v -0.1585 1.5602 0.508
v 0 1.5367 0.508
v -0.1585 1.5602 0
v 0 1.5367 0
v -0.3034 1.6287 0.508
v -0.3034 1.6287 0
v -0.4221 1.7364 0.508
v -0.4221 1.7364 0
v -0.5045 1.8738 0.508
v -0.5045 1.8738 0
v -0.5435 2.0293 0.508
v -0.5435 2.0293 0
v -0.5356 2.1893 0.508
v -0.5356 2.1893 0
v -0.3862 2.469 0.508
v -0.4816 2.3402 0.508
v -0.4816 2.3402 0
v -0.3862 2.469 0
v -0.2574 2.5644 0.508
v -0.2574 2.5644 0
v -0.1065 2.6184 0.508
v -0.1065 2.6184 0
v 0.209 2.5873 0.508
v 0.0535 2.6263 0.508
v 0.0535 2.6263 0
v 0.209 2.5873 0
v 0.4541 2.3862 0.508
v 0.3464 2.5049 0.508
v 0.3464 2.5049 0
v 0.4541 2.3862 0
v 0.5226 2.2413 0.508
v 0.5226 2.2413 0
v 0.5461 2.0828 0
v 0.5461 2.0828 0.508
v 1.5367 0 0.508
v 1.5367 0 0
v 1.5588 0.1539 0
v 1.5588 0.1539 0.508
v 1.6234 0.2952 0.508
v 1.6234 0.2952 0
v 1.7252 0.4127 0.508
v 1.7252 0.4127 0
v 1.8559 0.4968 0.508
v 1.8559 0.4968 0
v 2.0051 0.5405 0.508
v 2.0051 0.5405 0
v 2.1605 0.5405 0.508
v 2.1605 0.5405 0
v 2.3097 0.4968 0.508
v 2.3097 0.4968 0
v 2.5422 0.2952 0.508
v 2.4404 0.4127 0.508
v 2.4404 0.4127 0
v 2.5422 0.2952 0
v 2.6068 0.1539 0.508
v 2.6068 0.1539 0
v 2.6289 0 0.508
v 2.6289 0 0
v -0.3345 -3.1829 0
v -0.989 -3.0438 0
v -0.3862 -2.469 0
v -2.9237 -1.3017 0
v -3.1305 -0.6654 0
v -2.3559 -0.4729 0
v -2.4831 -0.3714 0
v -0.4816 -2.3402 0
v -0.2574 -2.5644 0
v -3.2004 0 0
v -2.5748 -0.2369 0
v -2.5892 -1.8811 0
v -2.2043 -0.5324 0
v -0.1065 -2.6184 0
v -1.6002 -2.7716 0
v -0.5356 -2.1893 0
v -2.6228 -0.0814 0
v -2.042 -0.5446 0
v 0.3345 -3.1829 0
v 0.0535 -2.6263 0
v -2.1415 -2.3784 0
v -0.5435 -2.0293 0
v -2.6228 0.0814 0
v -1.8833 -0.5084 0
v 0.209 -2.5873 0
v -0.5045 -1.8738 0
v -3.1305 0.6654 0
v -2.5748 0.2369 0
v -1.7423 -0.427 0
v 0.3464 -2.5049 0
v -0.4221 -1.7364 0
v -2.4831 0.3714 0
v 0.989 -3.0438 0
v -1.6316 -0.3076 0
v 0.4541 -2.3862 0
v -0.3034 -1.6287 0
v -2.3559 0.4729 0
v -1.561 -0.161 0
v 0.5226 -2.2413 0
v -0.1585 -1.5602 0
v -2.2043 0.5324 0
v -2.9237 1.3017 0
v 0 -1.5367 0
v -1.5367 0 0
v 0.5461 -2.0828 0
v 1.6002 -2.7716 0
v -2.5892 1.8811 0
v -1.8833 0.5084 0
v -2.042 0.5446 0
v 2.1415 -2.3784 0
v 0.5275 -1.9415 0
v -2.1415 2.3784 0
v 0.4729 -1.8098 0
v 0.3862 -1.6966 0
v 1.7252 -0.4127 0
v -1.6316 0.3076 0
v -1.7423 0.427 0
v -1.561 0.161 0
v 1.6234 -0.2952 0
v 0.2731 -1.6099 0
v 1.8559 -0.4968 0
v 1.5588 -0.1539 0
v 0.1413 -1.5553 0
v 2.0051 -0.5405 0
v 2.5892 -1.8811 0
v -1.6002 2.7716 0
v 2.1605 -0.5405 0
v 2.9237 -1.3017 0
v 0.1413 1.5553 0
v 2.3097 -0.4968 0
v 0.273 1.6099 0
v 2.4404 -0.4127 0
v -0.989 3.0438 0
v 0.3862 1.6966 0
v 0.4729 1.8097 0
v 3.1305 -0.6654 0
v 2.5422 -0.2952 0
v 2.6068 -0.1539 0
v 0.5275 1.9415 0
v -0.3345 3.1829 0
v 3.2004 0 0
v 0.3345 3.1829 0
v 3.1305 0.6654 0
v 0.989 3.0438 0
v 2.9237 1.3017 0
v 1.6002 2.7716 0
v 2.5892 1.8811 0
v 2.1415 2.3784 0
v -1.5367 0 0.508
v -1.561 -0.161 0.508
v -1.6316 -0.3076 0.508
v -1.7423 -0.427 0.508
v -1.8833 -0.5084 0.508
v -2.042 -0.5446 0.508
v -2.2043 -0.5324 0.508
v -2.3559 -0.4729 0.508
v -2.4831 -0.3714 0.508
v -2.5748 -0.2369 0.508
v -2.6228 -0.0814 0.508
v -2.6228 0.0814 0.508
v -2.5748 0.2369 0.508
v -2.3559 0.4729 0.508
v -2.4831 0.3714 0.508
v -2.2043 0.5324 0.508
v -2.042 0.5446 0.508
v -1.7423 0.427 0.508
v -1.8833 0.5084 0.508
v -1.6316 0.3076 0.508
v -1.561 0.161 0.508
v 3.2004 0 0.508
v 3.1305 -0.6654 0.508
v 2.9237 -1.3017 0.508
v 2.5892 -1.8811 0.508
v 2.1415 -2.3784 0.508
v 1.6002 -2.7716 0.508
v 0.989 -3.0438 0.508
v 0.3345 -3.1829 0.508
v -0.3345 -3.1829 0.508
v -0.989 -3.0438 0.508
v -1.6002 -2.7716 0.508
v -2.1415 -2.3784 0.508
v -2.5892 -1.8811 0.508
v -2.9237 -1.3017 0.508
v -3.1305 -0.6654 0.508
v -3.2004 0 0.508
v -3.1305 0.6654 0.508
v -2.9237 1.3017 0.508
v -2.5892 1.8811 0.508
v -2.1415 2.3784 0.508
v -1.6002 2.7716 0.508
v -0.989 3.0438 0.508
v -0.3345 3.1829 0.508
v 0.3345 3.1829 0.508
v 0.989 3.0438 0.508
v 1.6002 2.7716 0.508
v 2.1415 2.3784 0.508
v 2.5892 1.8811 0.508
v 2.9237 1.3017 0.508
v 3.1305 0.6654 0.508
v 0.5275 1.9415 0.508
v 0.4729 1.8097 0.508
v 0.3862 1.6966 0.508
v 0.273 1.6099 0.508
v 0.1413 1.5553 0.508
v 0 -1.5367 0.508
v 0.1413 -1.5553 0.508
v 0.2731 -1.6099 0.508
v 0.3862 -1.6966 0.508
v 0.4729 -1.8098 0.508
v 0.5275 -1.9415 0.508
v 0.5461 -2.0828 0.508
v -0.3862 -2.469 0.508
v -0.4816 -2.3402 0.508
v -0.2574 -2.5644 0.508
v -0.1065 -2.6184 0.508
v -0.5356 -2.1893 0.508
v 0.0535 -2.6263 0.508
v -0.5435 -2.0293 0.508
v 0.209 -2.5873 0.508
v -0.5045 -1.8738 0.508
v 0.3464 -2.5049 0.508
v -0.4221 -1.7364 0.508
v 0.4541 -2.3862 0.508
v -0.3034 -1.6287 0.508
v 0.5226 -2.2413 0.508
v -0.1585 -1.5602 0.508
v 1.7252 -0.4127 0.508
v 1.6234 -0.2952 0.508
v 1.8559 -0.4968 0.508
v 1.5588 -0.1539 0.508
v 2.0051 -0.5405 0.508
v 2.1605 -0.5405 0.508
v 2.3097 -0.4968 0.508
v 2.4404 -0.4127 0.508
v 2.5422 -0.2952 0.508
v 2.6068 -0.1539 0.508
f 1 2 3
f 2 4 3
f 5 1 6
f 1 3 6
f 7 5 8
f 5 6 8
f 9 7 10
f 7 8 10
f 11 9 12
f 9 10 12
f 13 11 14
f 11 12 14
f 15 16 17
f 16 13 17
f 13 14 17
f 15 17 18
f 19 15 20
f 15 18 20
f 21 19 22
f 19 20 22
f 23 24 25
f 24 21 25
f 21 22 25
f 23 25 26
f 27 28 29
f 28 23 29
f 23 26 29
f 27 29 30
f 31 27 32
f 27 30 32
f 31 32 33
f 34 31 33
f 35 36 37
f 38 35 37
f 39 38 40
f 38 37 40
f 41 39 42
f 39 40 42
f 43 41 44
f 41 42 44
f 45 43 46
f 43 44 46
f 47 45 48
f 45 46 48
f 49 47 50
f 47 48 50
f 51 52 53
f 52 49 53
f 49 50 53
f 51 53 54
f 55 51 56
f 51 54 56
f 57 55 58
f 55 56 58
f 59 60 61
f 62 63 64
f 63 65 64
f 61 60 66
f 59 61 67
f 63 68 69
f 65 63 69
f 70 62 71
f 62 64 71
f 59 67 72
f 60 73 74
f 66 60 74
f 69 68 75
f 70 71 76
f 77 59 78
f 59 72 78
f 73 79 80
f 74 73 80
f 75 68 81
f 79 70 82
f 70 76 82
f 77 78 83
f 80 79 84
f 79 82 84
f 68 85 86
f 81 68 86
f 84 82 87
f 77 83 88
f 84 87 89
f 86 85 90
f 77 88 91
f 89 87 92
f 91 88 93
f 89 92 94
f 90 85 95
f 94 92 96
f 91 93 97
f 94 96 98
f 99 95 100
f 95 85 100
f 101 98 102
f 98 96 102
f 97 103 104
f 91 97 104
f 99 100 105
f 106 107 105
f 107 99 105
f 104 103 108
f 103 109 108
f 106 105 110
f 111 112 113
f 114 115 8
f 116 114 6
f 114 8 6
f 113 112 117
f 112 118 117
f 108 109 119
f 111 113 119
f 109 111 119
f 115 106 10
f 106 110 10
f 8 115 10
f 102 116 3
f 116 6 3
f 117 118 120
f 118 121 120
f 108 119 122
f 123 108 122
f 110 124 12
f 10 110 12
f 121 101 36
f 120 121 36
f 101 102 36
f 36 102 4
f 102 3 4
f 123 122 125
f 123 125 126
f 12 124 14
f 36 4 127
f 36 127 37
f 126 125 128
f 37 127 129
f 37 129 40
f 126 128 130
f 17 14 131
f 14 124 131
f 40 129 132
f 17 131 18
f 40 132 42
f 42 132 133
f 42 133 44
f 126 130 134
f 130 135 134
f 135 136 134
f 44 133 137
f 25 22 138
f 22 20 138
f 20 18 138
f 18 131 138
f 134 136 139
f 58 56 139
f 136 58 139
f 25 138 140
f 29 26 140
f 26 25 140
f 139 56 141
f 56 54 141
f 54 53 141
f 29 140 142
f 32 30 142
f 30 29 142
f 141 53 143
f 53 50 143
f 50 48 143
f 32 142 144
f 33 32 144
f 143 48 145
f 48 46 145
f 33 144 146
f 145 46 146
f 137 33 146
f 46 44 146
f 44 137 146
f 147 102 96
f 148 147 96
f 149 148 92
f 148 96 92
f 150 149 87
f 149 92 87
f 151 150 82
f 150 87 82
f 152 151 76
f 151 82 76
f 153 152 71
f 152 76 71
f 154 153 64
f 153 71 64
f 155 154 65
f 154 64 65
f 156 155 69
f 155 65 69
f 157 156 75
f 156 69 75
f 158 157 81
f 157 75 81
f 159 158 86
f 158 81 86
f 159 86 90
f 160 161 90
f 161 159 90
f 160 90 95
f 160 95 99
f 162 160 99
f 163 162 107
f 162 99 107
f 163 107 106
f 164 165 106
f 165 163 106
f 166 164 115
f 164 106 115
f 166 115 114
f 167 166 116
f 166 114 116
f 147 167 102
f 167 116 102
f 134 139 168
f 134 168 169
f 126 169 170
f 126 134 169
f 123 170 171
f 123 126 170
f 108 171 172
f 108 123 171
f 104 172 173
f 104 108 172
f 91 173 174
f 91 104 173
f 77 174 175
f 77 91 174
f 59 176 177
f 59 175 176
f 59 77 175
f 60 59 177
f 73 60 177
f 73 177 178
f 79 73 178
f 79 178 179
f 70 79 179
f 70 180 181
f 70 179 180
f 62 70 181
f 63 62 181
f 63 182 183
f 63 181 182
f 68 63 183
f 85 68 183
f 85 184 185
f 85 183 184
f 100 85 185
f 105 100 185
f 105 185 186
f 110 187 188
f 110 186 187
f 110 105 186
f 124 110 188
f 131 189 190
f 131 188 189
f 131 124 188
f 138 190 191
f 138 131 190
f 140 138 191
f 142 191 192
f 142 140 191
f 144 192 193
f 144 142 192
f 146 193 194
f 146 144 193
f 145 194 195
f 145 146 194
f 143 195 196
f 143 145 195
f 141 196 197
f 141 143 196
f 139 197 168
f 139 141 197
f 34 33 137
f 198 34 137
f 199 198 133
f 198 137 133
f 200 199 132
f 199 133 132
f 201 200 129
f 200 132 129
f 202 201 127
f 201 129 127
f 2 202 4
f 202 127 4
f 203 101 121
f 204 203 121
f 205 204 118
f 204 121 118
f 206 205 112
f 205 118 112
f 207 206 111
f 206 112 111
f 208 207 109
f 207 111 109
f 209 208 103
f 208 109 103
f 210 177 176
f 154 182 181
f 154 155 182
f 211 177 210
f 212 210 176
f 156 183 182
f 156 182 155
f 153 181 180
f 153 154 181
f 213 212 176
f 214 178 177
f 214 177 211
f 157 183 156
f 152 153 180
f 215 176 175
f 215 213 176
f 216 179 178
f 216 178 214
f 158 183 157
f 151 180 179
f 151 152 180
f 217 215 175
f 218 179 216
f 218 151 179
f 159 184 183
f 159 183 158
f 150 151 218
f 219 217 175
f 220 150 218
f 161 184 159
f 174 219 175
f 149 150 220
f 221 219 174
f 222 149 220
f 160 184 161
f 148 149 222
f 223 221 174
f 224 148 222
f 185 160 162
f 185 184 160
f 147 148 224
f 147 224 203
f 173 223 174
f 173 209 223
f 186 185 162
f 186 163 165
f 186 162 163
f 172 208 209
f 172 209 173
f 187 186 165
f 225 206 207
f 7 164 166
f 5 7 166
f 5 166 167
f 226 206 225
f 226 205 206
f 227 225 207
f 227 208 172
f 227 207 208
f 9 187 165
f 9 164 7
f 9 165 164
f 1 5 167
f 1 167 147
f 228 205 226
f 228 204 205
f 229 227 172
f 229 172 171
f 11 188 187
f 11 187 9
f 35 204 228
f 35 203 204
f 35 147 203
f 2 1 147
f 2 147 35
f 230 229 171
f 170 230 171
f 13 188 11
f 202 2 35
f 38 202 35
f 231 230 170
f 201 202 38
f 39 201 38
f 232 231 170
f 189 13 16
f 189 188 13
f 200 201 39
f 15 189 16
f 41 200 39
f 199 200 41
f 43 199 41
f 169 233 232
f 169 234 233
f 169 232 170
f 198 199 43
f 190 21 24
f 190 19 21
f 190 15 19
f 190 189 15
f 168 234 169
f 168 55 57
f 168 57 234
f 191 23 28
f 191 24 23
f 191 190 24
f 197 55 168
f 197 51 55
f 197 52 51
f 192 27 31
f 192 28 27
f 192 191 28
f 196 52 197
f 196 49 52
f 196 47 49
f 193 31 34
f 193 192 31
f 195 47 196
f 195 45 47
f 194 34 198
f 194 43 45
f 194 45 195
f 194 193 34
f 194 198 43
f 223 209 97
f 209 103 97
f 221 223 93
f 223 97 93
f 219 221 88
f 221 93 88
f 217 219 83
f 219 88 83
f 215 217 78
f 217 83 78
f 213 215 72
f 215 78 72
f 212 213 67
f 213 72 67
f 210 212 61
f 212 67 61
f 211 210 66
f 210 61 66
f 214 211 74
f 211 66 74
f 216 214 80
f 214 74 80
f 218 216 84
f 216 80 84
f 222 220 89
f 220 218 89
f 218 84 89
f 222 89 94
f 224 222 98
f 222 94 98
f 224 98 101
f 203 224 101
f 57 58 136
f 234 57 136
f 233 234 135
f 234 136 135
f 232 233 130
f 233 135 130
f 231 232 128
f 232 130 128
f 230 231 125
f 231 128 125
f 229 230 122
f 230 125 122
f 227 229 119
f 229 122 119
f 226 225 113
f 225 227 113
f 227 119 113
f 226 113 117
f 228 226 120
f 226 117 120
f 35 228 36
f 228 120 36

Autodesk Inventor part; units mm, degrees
ref_plane "YZ Plane" through (0, 0, 0) normal (1, 0, 0) x (0, 1, 0)
ref_plane "XZ Plane" through (0, 0, 0) normal (0, 1, 0) x (-1, 0, 0)
ref_plane "XY Plane" through (0, 0, 0) normal (0, 0, 1) x (1, 0, 0)
sketch "Sketch1" plane through (0, 0, 0) normal (0, 0, 1) x (1, 0, 0)
  circle A0 centre (0, 0) radius 3.2004
  line L0 (0, 0) -> (0, 2.0828)
  line L1 (0, 0) -> (2.0828, 0)
  line L2 (0, 0) -> (0, -2.0828)
  line L3 (0, 0) -> (-2.0828, 0)
  circle A1 centre (0, 2.0828) radius 0.5461
  circle A2 centre (2.0828, 0) radius 0.5461
  circle A3 centre (0, -2.0828) radius 0.5461
  circle A4 centre (-2.0828, 0) radius 0.5461
  dimension "d1" = 2.0828
  dimension "d2" = 2.0828
  dimension "d3" = 2.0828
  dimension "d4" = 2.0828
  dimension "d5" = 1.0922
  dimension "d6" = 1.0922
  dimension "d7" = 1.0922
  dimension "d8" = 1.0922
extrude "Extrusion1" add sketch "Sketch1" along normal blind 0.508
properties part number "cap"
